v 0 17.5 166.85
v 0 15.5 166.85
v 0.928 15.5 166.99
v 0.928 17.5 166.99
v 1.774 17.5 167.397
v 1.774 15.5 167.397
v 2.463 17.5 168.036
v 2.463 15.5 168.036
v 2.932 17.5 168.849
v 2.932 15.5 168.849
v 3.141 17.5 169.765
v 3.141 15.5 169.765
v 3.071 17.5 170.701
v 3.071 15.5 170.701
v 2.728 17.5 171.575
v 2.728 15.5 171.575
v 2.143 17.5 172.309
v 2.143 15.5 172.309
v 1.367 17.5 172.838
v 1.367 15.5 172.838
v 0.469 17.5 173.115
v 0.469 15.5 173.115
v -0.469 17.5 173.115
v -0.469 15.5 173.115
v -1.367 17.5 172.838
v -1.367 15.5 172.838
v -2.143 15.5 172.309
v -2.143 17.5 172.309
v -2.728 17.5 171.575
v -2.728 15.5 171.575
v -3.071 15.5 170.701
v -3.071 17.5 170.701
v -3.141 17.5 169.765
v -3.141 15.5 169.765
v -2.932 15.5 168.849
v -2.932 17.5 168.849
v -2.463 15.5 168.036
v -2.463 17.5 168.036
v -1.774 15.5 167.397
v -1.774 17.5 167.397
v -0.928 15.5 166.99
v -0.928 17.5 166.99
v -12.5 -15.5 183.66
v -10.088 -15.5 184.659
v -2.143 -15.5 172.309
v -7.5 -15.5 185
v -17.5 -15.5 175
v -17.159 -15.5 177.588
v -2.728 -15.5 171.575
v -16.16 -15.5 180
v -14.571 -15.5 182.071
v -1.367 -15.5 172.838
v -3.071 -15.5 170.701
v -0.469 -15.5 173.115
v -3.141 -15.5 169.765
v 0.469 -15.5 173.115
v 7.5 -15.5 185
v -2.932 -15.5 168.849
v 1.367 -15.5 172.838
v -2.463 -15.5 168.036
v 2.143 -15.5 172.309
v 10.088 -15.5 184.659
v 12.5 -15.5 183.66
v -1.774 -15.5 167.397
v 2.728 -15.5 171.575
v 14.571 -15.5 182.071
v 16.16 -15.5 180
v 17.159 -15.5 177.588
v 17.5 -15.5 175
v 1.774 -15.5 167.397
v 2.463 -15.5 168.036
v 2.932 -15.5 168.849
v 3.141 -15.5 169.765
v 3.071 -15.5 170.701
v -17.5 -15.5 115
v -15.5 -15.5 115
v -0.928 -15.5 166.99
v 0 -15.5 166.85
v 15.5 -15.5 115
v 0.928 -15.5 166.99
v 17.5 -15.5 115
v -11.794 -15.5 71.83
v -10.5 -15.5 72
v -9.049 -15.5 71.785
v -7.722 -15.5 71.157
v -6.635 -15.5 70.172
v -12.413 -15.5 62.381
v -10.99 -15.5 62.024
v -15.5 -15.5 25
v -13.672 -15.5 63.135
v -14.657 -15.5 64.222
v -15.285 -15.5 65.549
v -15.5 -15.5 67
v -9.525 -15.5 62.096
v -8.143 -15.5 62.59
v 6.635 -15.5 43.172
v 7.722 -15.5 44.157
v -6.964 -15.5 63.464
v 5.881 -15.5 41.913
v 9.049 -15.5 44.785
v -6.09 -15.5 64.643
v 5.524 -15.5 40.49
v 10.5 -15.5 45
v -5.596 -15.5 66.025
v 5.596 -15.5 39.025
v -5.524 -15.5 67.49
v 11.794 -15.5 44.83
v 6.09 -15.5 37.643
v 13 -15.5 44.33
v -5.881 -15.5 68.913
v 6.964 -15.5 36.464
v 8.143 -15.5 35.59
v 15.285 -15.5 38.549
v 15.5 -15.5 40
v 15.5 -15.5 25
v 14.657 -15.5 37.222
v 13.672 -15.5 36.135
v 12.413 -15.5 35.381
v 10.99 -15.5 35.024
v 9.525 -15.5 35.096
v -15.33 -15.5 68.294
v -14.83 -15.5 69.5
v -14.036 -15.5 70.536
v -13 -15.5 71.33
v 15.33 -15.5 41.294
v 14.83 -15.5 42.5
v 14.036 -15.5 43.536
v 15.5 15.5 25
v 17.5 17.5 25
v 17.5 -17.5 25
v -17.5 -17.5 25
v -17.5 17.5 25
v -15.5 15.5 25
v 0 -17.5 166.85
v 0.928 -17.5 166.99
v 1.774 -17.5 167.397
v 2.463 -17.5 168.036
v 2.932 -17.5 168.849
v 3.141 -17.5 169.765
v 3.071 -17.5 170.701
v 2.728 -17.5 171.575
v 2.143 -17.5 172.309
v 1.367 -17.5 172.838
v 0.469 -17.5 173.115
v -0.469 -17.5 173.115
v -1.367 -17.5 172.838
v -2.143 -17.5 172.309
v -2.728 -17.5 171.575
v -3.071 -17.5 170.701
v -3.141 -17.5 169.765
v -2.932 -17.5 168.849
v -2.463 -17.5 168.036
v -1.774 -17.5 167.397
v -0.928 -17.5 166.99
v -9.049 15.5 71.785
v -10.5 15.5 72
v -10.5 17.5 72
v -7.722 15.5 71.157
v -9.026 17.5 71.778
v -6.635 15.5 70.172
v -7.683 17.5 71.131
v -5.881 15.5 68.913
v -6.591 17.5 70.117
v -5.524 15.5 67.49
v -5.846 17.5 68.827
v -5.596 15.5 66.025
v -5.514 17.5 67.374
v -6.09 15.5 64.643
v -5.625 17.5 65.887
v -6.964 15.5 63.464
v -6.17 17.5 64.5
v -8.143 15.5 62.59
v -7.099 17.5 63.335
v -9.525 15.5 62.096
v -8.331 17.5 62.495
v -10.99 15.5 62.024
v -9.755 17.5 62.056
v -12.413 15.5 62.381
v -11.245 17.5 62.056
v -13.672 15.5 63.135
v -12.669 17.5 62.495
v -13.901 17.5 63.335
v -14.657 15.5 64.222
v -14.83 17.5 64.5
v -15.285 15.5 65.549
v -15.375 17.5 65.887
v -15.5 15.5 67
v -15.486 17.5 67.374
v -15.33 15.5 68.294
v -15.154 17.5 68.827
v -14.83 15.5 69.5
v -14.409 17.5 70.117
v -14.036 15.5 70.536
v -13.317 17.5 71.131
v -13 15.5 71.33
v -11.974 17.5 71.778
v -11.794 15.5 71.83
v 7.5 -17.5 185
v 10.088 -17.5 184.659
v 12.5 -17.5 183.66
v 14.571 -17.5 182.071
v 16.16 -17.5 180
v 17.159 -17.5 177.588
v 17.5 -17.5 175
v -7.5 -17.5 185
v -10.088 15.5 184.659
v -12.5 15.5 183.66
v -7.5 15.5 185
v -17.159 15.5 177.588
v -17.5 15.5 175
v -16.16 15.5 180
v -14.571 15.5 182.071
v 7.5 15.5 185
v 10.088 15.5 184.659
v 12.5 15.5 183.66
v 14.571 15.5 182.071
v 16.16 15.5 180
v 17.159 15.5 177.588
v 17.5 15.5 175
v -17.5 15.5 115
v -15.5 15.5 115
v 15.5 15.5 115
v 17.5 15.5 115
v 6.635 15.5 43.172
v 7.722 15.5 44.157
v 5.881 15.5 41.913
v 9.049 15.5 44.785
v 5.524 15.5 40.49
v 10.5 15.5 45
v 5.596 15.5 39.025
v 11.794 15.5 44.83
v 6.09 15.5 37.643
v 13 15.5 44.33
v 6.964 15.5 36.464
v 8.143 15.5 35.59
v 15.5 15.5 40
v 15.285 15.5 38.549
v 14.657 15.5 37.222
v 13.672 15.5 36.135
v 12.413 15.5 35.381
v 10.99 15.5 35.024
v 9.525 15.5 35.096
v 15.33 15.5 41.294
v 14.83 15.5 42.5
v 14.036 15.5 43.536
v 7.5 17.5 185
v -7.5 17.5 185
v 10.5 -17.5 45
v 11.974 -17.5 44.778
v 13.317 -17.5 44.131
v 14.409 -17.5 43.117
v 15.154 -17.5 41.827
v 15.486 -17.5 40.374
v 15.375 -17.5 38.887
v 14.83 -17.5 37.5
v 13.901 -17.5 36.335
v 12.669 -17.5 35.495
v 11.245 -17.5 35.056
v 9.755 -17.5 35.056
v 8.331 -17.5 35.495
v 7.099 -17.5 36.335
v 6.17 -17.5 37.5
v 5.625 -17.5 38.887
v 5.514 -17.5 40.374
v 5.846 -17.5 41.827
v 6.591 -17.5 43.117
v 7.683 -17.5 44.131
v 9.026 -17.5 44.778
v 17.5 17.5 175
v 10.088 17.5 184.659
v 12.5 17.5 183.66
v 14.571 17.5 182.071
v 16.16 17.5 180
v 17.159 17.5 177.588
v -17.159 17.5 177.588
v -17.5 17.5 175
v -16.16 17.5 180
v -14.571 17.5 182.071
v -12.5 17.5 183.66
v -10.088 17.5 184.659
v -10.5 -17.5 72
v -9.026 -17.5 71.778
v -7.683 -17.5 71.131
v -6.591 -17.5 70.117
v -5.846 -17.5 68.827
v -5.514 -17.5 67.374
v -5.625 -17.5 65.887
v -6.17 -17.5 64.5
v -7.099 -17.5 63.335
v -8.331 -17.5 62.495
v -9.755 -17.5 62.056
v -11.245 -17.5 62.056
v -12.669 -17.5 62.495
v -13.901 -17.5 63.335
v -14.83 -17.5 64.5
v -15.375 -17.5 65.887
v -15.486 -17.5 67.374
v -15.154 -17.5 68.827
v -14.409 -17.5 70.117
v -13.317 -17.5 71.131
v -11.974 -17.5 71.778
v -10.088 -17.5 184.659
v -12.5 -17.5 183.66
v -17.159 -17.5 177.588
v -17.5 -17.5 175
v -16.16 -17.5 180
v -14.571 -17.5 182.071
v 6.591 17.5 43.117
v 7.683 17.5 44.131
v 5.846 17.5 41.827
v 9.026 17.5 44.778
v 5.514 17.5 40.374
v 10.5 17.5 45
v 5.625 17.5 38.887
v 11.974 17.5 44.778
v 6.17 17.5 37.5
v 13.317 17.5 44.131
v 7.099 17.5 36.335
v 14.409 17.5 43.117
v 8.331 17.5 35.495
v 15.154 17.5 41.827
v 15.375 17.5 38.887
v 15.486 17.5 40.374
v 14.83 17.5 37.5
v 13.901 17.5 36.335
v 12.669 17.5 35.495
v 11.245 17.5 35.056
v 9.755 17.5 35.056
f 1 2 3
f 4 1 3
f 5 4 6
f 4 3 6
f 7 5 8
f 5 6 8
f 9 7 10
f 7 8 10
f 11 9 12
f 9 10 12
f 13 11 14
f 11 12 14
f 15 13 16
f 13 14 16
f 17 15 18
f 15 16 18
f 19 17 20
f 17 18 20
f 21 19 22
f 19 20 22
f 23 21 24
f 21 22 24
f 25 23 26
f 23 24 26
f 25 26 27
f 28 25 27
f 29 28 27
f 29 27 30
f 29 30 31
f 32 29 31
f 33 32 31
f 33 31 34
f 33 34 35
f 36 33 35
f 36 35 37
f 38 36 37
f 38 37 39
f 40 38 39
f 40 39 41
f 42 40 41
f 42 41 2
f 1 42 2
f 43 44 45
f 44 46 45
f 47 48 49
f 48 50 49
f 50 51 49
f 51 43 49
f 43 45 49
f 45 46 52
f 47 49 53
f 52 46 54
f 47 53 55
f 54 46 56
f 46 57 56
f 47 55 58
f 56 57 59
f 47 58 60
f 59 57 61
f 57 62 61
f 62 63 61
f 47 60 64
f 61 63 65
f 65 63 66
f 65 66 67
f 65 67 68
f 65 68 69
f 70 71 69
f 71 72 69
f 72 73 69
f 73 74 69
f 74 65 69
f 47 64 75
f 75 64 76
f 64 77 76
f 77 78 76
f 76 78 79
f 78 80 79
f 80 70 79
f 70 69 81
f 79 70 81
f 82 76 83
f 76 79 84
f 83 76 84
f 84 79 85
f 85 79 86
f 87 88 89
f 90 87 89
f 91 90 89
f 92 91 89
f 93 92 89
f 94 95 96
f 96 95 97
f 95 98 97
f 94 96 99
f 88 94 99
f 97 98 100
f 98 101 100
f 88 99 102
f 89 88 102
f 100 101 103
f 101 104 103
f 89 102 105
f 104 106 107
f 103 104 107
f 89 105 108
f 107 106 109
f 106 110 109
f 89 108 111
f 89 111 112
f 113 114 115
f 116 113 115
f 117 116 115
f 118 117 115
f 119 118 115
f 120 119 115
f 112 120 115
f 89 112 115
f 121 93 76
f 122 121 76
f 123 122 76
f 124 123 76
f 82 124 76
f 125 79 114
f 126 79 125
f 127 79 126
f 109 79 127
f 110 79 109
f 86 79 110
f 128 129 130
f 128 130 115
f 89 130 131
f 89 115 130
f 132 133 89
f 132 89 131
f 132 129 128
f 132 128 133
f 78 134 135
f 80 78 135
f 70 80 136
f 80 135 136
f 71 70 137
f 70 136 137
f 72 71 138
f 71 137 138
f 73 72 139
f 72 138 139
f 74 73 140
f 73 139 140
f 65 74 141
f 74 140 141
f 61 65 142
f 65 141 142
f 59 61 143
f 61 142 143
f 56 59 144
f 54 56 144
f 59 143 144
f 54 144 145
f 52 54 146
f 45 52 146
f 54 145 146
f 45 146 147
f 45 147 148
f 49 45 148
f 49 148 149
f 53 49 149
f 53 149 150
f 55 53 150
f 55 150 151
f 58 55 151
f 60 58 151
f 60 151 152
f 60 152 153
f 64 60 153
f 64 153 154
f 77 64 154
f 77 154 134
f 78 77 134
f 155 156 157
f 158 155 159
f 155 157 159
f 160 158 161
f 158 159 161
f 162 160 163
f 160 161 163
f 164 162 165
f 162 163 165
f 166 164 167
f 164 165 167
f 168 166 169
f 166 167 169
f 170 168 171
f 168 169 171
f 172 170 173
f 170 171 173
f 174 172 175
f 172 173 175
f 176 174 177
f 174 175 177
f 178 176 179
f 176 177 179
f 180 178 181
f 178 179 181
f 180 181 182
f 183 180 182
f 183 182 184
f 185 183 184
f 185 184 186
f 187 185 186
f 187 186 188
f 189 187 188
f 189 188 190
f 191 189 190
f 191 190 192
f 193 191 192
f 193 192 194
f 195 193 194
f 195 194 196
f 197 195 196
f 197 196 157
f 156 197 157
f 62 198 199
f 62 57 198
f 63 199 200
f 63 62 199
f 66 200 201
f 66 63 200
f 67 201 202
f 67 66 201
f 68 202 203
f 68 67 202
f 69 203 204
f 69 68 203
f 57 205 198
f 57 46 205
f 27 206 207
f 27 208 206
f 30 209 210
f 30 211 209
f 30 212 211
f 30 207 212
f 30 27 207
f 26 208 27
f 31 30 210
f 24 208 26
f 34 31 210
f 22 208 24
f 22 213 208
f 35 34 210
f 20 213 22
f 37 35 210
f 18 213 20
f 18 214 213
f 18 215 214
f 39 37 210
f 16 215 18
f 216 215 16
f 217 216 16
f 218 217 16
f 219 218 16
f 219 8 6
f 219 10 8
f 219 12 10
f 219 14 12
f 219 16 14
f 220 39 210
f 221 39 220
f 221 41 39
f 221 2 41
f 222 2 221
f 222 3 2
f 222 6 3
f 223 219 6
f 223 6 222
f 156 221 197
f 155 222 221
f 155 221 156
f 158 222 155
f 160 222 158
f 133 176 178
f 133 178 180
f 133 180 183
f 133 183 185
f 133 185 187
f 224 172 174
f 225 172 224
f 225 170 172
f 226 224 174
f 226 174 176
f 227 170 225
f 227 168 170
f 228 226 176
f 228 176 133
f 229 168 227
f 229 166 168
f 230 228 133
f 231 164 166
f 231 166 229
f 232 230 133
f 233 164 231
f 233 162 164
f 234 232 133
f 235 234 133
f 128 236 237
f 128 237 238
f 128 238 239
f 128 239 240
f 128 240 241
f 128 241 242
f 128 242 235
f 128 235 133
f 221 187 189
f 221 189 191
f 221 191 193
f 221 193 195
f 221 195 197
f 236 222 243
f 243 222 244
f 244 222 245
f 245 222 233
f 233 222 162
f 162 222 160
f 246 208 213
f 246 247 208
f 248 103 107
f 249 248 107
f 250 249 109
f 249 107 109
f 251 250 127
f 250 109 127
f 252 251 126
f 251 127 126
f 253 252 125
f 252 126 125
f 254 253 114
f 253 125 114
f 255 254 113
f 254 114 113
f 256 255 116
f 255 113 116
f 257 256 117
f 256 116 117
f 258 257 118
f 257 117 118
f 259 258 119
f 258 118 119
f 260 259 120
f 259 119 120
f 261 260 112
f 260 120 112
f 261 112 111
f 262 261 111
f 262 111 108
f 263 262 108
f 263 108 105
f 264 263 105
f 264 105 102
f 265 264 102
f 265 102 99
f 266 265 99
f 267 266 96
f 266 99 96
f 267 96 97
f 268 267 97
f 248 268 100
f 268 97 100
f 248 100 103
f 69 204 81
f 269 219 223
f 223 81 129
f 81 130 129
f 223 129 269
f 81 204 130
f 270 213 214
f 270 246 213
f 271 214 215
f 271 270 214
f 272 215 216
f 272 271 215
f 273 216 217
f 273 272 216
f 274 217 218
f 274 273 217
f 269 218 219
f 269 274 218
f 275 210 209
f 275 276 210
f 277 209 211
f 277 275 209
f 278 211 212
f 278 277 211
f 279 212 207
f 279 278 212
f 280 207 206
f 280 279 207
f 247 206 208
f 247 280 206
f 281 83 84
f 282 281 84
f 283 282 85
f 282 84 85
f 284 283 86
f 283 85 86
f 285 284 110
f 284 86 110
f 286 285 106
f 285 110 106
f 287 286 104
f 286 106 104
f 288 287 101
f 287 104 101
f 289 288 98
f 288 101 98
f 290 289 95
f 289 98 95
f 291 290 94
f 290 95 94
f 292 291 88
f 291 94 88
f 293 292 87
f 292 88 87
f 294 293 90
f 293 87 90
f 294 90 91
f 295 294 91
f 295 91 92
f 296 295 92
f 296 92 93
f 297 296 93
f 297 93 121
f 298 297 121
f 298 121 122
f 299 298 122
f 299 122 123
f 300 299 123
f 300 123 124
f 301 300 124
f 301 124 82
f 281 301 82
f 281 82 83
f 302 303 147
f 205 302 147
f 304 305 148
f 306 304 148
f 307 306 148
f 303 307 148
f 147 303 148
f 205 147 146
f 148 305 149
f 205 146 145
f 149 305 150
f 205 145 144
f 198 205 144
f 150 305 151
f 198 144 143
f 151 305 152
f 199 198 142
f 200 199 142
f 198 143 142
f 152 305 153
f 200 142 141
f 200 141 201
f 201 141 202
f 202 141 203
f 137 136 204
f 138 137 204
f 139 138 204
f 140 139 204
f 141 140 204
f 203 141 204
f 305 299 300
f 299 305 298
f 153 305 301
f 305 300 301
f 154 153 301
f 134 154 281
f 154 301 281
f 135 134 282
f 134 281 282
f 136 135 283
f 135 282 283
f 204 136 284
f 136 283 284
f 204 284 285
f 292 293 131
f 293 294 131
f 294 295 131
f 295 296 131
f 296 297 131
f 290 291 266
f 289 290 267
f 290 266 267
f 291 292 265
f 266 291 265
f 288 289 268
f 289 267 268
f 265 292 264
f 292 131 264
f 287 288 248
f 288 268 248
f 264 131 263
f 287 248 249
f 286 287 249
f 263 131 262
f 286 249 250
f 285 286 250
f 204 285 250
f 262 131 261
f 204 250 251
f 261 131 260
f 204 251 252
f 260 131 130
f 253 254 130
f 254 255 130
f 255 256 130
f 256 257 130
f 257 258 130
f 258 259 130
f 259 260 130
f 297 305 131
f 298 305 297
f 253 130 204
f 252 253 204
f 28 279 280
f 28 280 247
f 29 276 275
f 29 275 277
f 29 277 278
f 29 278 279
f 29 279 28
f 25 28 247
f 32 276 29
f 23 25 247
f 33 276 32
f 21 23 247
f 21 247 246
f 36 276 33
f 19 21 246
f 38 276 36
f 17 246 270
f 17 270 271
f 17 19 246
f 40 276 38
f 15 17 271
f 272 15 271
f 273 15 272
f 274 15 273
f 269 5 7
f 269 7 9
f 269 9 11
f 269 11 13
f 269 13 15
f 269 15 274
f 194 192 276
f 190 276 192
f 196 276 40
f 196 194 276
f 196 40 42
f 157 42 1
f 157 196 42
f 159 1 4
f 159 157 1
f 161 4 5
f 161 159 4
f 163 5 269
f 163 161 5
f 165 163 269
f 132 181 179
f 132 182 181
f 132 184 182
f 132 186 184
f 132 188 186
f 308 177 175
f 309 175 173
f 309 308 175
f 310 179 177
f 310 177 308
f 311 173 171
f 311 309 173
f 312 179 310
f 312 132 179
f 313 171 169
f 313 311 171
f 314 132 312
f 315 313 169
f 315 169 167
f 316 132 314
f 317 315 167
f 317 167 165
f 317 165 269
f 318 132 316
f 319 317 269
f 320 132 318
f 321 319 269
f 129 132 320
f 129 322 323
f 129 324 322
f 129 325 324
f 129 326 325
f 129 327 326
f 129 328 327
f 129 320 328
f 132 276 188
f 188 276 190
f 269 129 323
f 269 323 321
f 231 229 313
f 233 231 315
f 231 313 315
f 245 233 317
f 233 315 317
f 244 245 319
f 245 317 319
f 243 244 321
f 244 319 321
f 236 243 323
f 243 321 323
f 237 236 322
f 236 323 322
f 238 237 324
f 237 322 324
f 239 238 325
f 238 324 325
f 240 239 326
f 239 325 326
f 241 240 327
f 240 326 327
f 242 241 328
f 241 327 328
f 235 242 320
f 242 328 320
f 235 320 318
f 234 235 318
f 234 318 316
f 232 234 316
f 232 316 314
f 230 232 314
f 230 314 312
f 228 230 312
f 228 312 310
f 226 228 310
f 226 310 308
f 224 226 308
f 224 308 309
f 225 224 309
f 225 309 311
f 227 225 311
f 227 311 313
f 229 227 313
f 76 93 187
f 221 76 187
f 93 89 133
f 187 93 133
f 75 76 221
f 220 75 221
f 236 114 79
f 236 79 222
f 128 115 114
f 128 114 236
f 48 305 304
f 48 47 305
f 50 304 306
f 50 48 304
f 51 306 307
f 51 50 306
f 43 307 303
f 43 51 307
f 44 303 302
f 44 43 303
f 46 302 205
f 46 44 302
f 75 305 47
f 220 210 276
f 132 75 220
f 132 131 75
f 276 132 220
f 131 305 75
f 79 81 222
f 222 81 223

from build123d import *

# Parameters (mm, degrees)
SKIZZE1_W                       = 35
SKIZZE1_H                       = 35
SKIZZE1_W_2                     = 31
SKIZZE1_H_2                     = 31
AUFSATZ_LINEAR_AUSTRAGEN1_DEPTH = 185
SKIZZE6_W                       = 70
SKIZZE6_H                       = 31
SCHNITT_LINEAR_AUSTRAGEN1_DEPTH = 190.093230974
SKIZZE7_R                       = 3.15
SCHNITT_LINEAR_AUSTRAGEN2_DEPTH = 190.093230974
VERRUNDUNG1_R                   = 10
SKIZZE10_W                      = 39.330921978
SKIZZE10_H                      = 37.025640666
SCHNITT_LINEAR_AUSTRAGEN3_DEPTH = 25
SKIZZE11_R                      = 5
SCHNITT_LINEAR_AUSTRAGEN4_DEPTH = 190.093230974


with BuildPart() as part:
    # Skizze1 → Aufsatz-Linear austragen1 (new body)
    with BuildSketch(Plane.XY):
        Rectangle(SKIZZE1_W, SKIZZE1_H)
        Rectangle(SKIZZE1_W_2, SKIZZE1_H_2, mode=Mode.SUBTRACT)
    extrude(amount=AUFSATZ_LINEAR_AUSTRAGEN1_DEPTH)

    # Skizze6 → Schnitt-Linear austragen1 (cut, through all)
    with BuildSketch(Plane(origin=(17.5, 0, 0), x_dir=(0, 0, -1), z_dir=(1, 0, 0))):
        with Locations((-150, 0)):
            Rectangle(SKIZZE6_W, SKIZZE6_H)
    extrude(amount=-SCHNITT_LINEAR_AUSTRAGEN1_DEPTH, mode=Mode.SUBTRACT)

    # Skizze7 → Schnitt-Linear austragen2 (cut, through all)
    with BuildSketch(Plane.XZ.offset(17.5)):
        with Locations(Location((0, 170, 0), (0, 0, 270))):
            Circle(SKIZZE7_R)
    extrude(amount=-SCHNITT_LINEAR_AUSTRAGEN2_DEPTH, mode=Mode.SUBTRACT)

    # Verrundung1
    verrundung1_edges = [part.edges().sort_by_distance(p)[0] for p in [
        (-17.5, 16.5, 185),
        (-17.5, -16.5, 185),
        (17.5, 16.5, 185),
        (17.5, -16.5, 185),
    ]]
    fillet(verrundung1_edges, radius=VERRUNDUNG1_R)

    # Skizze10 → Schnitt-Linear austragen3 (cut)
    with BuildSketch(Plane(origin=(0, 0, 0), x_dir=(-1, 0, 0), z_dir=(0, 0, -1))):
        Rectangle(SKIZZE10_W, SKIZZE10_H)
    extrude(amount=-SCHNITT_LINEAR_AUSTRAGEN3_DEPTH, mode=Mode.SUBTRACT)

    # Skizze11 → Schnitt-Linear austragen4 (cut, through all)
    with BuildSketch(Plane(origin=(0, 17.5, 0), x_dir=(1, 0, 0), z_dir=(0, 1, 0))):
        with Locations(Location((10.5, -40, 0), (0, 0, 270))):
            Circle(SKIZZE11_R)
        with Locations(Location((-10.5, -67, 0), (0, 0, 270))):
            Circle(SKIZZE11_R)
    extrude(amount=-SCHNITT_LINEAR_AUSTRAGEN4_DEPTH, mode=Mode.SUBTRACT)


solid = part.part
